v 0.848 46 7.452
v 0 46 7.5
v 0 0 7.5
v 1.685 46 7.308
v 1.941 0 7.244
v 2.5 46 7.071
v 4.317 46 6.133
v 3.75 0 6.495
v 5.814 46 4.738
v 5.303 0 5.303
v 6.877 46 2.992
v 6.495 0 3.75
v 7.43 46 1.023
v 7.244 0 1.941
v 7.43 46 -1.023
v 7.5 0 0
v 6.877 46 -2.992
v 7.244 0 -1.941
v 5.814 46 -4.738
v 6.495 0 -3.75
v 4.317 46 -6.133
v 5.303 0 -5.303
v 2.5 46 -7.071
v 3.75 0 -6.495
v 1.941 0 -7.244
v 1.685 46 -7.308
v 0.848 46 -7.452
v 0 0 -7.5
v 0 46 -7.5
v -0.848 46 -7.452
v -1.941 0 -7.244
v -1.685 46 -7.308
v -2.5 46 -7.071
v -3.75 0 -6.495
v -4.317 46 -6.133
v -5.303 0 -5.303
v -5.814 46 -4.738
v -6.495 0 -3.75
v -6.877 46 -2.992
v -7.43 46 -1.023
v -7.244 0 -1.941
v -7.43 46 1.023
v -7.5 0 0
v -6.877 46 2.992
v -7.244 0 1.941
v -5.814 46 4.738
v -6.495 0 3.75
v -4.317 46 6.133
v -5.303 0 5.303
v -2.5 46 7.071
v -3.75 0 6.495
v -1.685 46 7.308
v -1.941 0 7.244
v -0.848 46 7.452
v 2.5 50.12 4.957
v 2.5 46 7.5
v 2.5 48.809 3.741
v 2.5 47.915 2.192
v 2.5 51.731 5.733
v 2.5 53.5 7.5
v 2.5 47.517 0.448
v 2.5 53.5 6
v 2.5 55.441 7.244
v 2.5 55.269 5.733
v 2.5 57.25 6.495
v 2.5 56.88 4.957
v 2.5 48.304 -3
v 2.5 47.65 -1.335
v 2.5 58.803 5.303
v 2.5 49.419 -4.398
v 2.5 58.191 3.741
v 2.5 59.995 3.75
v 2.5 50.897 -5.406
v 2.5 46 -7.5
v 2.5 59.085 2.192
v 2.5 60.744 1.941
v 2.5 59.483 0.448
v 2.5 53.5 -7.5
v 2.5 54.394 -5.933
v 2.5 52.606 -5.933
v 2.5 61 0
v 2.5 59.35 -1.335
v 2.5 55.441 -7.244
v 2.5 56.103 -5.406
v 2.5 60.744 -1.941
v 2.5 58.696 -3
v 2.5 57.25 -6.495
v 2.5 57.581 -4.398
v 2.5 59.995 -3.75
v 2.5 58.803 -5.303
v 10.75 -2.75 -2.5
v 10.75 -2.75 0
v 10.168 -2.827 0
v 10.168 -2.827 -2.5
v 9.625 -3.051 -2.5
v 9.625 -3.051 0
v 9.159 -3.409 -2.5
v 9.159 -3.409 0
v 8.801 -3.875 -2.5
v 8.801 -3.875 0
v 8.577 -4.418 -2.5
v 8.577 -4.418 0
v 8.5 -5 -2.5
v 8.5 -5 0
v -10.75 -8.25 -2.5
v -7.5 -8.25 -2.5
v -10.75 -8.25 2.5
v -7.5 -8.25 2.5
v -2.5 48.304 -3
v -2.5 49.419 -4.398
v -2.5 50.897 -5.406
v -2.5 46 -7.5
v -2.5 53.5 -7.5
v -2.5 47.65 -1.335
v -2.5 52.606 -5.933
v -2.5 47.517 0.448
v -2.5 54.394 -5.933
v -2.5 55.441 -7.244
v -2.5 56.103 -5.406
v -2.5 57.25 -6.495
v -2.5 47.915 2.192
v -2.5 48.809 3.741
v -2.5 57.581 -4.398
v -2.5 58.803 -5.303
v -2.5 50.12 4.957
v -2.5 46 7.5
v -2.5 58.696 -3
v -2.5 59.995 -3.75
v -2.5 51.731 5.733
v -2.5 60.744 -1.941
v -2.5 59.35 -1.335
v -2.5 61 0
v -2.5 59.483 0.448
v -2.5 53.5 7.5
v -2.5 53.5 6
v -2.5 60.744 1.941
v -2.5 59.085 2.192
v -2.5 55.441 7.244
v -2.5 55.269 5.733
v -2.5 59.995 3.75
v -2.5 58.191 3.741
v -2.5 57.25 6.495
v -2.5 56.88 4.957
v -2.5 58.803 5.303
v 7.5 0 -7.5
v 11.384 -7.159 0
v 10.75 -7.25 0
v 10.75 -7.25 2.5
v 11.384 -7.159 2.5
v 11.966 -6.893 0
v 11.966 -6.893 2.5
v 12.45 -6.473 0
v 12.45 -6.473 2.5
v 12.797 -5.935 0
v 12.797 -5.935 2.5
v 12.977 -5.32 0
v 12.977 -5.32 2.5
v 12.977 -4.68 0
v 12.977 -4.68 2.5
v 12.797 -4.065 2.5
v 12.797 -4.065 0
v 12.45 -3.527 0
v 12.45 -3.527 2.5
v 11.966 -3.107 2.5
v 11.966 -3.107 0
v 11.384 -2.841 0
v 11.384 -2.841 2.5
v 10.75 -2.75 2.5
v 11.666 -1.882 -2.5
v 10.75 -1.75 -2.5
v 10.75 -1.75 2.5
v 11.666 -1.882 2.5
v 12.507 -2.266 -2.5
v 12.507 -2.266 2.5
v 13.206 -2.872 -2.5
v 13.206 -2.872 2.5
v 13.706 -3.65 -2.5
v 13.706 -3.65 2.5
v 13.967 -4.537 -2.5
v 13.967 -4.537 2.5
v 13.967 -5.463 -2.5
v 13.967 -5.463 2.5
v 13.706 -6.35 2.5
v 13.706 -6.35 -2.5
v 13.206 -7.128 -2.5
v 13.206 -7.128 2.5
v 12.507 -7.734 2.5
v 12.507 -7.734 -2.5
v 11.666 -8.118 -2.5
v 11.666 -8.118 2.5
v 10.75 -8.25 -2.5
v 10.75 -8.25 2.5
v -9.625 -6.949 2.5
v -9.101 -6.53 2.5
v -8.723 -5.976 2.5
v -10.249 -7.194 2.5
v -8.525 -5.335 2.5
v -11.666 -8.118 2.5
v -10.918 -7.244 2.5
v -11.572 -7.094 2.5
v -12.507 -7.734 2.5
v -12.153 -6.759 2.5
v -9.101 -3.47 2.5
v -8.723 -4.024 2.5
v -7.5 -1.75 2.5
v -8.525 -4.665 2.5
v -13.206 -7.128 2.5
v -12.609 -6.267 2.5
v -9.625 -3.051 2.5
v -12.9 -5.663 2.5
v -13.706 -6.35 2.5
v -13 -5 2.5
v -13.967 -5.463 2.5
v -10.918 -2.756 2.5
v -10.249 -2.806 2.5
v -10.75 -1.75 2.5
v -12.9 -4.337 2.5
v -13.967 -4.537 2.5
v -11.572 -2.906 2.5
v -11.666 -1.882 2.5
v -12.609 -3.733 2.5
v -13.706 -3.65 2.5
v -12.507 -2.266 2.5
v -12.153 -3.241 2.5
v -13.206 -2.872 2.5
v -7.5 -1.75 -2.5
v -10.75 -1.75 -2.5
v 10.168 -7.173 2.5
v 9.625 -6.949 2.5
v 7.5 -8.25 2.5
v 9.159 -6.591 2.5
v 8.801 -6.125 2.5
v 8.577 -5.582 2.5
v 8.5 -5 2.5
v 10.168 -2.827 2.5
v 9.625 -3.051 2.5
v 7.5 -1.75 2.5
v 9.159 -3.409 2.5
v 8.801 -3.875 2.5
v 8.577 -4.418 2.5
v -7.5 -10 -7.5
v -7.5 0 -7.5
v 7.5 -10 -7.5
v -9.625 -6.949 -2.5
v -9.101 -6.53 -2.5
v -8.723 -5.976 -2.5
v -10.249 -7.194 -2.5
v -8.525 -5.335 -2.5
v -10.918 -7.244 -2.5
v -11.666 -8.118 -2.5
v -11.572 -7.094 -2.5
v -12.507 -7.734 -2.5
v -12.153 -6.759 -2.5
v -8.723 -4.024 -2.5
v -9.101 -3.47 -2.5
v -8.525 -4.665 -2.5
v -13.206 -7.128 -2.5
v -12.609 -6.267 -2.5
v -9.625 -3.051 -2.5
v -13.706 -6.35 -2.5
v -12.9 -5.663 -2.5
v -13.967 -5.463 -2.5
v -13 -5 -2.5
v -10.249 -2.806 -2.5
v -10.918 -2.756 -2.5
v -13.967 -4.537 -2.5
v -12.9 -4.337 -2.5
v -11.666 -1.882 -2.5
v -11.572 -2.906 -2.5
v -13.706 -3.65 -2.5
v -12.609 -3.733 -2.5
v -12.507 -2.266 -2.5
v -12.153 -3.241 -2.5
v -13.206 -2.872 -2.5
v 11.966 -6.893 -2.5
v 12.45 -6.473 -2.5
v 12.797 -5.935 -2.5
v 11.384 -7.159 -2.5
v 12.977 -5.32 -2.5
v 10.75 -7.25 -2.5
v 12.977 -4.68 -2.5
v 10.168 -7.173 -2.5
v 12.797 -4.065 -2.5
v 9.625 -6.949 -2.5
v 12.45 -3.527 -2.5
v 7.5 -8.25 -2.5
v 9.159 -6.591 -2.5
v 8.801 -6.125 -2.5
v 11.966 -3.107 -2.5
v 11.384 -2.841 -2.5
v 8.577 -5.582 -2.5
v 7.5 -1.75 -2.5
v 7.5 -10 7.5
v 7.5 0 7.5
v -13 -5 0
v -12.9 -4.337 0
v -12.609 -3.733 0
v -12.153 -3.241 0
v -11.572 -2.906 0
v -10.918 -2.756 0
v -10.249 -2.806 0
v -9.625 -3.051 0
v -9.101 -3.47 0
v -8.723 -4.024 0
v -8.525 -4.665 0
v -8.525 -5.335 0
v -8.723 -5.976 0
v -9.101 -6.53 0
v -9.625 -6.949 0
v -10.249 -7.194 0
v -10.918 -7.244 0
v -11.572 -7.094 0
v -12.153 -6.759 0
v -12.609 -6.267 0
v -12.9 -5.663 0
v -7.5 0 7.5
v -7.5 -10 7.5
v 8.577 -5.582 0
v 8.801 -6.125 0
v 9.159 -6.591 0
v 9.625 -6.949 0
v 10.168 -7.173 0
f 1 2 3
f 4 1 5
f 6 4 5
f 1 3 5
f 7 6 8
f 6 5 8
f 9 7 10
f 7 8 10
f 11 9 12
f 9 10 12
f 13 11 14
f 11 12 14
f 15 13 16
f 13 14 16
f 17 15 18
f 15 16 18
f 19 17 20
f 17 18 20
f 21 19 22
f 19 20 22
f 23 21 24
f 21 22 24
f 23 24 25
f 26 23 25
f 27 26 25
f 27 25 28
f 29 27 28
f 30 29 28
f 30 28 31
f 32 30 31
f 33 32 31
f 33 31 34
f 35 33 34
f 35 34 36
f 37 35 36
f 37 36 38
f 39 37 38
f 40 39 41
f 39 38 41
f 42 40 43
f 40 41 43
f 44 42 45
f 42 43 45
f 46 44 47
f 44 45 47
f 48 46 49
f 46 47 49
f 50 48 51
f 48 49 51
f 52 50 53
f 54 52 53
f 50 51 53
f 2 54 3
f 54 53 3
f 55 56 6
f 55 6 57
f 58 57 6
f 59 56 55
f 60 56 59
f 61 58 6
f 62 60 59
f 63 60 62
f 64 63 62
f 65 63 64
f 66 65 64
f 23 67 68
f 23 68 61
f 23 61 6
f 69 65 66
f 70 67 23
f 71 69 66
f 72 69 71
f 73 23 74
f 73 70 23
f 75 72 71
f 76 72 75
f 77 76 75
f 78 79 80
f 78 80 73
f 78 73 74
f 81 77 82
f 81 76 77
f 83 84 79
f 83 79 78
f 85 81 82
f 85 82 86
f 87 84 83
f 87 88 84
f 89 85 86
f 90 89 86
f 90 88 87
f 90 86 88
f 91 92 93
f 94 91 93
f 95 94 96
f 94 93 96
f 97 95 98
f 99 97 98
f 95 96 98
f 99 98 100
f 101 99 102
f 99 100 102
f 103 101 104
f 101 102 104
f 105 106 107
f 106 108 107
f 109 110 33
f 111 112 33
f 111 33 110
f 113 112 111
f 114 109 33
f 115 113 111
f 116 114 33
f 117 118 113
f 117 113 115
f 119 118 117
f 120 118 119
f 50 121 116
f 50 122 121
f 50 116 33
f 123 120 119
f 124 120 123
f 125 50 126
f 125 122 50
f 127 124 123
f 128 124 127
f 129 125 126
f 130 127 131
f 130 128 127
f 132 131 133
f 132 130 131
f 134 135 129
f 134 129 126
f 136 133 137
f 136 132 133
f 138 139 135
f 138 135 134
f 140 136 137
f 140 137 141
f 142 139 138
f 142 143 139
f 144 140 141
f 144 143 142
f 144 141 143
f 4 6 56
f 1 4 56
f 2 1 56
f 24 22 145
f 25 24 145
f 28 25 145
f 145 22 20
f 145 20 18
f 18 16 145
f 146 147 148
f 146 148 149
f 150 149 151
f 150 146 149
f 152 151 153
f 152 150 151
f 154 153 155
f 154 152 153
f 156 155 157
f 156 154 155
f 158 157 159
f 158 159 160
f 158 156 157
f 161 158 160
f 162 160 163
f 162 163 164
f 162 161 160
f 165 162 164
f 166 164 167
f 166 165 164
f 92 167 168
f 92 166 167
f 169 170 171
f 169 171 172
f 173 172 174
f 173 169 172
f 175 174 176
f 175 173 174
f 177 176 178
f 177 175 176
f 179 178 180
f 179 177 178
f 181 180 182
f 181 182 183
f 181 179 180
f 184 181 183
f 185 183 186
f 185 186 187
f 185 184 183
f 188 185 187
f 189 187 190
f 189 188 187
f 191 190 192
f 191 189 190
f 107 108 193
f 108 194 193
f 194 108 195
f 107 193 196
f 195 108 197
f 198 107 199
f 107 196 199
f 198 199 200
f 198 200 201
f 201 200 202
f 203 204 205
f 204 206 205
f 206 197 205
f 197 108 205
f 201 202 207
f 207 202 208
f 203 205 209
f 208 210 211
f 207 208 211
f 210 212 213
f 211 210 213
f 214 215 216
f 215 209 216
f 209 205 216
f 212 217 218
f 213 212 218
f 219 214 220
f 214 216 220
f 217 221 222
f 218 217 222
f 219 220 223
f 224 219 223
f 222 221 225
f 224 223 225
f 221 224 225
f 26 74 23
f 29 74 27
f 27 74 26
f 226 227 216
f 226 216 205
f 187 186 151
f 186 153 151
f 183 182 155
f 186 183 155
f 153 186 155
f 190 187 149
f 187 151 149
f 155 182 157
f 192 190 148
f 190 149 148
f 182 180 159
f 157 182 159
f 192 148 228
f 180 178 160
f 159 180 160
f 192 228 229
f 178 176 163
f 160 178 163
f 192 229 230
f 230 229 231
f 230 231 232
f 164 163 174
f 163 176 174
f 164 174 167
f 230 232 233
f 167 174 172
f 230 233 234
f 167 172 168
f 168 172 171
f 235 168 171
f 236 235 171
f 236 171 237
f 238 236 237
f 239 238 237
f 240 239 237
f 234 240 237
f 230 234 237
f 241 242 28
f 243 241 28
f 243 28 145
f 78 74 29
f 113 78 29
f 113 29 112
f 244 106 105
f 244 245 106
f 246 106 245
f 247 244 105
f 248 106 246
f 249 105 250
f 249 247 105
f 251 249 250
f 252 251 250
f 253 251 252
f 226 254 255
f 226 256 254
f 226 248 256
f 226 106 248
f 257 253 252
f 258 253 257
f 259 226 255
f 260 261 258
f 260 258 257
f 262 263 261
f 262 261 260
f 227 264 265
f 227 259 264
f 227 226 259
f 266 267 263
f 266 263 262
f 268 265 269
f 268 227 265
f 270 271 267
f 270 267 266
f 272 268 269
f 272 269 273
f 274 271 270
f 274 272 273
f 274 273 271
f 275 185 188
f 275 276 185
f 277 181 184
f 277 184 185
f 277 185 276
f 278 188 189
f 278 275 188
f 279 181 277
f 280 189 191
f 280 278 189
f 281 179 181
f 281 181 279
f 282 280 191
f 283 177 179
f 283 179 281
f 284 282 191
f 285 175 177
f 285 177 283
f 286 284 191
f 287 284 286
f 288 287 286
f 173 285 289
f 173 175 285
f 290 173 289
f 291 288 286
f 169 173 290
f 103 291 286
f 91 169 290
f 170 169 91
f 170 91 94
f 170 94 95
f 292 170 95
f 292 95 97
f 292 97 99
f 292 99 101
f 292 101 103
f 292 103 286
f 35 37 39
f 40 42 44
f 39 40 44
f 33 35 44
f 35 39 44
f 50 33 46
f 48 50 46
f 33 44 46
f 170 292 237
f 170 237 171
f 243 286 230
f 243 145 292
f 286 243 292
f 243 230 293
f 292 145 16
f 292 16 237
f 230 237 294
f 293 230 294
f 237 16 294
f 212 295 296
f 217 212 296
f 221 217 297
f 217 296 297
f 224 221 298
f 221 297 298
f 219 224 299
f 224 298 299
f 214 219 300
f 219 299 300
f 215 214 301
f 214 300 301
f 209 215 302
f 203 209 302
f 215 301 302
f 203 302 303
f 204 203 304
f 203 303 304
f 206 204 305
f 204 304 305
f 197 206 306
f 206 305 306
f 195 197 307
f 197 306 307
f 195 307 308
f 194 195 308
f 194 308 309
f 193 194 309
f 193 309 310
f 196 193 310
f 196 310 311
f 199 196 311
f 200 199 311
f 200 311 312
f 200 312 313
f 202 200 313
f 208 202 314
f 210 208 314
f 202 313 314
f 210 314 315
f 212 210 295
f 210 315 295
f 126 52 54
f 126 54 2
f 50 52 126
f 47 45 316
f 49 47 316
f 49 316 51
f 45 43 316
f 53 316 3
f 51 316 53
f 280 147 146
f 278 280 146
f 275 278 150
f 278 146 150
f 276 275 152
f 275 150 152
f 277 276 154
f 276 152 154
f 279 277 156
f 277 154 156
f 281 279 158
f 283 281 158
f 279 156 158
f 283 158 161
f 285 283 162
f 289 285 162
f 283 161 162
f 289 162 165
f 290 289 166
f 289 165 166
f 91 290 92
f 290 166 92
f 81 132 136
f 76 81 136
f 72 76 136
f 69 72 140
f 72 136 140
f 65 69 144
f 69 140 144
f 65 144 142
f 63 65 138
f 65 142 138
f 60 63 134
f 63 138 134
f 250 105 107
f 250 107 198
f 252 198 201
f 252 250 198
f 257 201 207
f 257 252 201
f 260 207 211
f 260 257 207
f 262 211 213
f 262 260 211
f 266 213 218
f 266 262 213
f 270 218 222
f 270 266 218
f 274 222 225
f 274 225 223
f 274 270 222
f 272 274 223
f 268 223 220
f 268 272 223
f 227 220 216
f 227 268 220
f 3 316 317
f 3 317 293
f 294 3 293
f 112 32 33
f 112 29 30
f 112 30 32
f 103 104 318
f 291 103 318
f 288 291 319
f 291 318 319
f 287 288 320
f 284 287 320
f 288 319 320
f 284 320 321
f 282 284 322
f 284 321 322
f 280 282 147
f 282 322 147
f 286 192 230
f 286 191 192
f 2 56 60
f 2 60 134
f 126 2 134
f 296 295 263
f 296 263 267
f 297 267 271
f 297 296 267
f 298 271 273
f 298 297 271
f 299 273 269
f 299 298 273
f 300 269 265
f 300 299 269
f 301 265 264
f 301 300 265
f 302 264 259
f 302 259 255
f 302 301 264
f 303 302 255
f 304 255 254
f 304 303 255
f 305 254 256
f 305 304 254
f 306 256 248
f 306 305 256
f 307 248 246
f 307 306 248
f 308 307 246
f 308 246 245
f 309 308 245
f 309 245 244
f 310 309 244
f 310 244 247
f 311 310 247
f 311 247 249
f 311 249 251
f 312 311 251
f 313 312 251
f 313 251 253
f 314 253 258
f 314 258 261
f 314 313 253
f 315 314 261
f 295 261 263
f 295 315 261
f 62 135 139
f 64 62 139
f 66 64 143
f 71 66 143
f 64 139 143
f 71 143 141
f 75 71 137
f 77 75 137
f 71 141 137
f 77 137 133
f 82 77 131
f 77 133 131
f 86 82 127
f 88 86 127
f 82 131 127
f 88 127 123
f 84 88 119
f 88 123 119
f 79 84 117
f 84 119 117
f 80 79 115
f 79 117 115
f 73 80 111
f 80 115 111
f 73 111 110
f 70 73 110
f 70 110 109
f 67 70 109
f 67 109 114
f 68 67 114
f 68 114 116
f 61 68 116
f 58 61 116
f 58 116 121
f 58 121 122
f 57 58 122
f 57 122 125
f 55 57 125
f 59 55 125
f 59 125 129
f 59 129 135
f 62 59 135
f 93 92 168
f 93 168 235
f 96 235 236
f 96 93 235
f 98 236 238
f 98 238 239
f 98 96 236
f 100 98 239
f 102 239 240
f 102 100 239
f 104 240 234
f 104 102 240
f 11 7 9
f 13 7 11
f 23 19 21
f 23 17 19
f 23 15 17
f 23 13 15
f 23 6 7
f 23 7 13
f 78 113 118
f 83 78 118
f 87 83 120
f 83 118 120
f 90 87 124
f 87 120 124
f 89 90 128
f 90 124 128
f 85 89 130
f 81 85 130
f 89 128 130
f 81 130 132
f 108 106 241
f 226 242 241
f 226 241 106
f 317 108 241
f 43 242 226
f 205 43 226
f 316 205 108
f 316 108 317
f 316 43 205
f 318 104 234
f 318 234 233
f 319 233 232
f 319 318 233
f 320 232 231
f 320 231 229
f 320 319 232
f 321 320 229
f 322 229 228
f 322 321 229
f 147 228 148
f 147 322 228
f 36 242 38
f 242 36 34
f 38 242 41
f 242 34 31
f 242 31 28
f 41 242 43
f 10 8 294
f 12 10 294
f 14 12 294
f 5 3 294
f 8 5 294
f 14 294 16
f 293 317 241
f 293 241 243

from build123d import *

# Parameters (mm, degrees)
SKETCH1_R           = 7.5
BOSS_EXTRUDE1_DEPTH = 46
SKETCH2_W           = 15
SKETCH2_H           = 15
BOSS_EXTRUDE2_DEPTH = 10
BOSS_EXTRUDE3_DEPTH = 15
CUT_EXTRUDE4_DEPTH  = 64.263338514
SKETCH6_R           = 6
CUT_EXTRUDE5_DEPTH  = 64.263338514
SKETCH7_R           = 6
CUT_EXTRUDE6_DEPTH  = 5
CUT_EXTRUDE7_START  = -5
CUT_EXTRUDE7_DEPTH  = 5
SKETCH11_R          = 3.25
SKETCH11_R_2        = 2.25
BOSS_EXTRUDE4_DEPTH = 2.5
BOSS_EXTRUDE5_DEPTH = 2.5


with BuildPart() as part:
    # Sketch1 → Boss-Extrude1 (new body)
    with BuildSketch(Plane(origin=(0, 0, 0), x_dir=(1, 0, 0), z_dir=(0, 1, 0))):
        with Locations(Location((0, 0, 0), (0, 0, 270))):
            Circle(SKETCH1_R)
    extrude(amount=BOSS_EXTRUDE1_DEPTH)

    # Sketch2 → Boss-Extrude2 (add)
    with BuildSketch(Plane.XZ):
        Rectangle(SKETCH2_W, SKETCH2_H)
    extrude(amount=BOSS_EXTRUDE2_DEPTH)

    # Sketch4 → Boss-Extrude3 (add)
    with BuildSketch(Plane(origin=(0, 46, 0), x_dir=(1, 0, 0), z_dir=(0, 1, 0))):
        Polygon((0, 7.5), (7.5, 7.5), (7.5, -7.5), (-7.5, -7.5), (-7.5, 7.5), align=None)
    extrude(amount=BOSS_EXTRUDE3_DEPTH)

    # Sketch5 → Cut-Extrude4 (cut, through all)
    with BuildSketch(Plane.ZY.offset(7.5)):
        with BuildLine():
            ThreePointArc((-7.5, 53.5), (-5.303300859, 58.803300859), (0, 61))
            Line((0, 61), (-7.5, 61))
            Line((-7.5, 61), (-7.5, 53.5))
        make_face()
        with BuildLine():
            Line((7.5, 61), (0, 61))
            ThreePointArc((0, 61), (5.303300859, 58.803300859), (7.5, 53.5))
            Line((7.5, 53.5), (7.5, 61))
        make_face()
    extrude(amount=-CUT_EXTRUDE4_DEPTH, mode=Mode.SUBTRACT)

    # Sketch6 → Cut-Extrude5 (cut, through all)
    with BuildSketch(Plane.ZY.offset(7.5)):
        with Locations((0, 53.5)):
            Circle(SKETCH6_R)
    extrude(amount=-CUT_EXTRUDE5_DEPTH, mode=Mode.SUBTRACT)

    # Sketch7 → Cut-Extrude6 (cut)
    # profile 1 of 4: a face of its own
    with BuildSketch(Plane.ZY.offset(7.5)):
        with BuildLine():
            ThreePointArc((0, 46), (-5.303300859, 48.196699141), (-7.5, 53.5))
            Line((-7.5, 53.5), (-7.5, 46))
            Line((-7.5, 46), (0, 46))
        make_face()
    # profile 2 of 4: a face of its own
    with BuildSketch(Plane.ZY.offset(7.5)):
        with BuildLine():
            Line((7.5, 46), (7.5, 53.5))
            ThreePointArc((7.5, 53.5), (5.303300859, 48.196699141), (0, 46))
            Line((0, 46), (7.5, 46))
        make_face()
    # profile 3 of 4: a face of its own
    with BuildSketch(Plane.ZY.offset(7.5)):
        with BuildLine():
            ThreePointArc((7.5, 53.5), (0, 61), (-7.5, 53.5))
            ThreePointArc((-7.5, 53.5), (-5.303300859, 48.196699141), (0, 46))
            ThreePointArc((0, 46), (5.303300859, 48.196699141), (7.5, 53.5))
        make_face()
        with Locations((0, 53.5)):
            Circle(SKETCH7_R, mode=Mode.SUBTRACT)
    # profile 4 of 4: a face of its own
    with BuildSketch(Plane.ZY.offset(7.5)):
        with Locations((0, 53.5)):
            Circle(SKETCH7_R)
    extrude(amount=-CUT_EXTRUDE6_DEPTH, mode=Mode.SUBTRACT)

    # Sketch10 → Cut-Extrude7 (cut)
    with BuildSketch(Plane(origin=(7.5, 0, 0), x_dir=(0, 0, -1), z_dir=(1, 0, 0)).offset(CUT_EXTRUDE7_START)):
        with BuildLine():
            Line((7.5, 53.5), (6, 53.5))
            ThreePointArc((6, 53.5), (0, 47.5), (-6, 53.5))
            Line((-6, 53.5), (-7.5, 53.5))
            Line((-7.5, 53.5), (-7.5, 46))
            Line((-7.5, 46), (0, 46))
            Line((0, 46), (7.5, 46))
            Line((7.5, 46), (7.5, 53.5))
        make_face()
        with BuildLine():
            ThreePointArc((-6, 53.5), (0, 59.5), (6, 53.5))
            Line((6, 53.5), (7.5, 53.5))
            ThreePointArc((7.5, 53.5), (0, 61), (-7.5, 53.5))
            Line((-7.5, 53.5), (-6, 53.5))
        make_face()
    extrude(amount=CUT_EXTRUDE7_DEPTH, mode=Mode.SUBTRACT)

    # Sketch11 → Boss-Extrude4 (add, symmetric)
    # profile 1 of 3: a face of its own
    with BuildSketch(Plane(origin=(0, 0, 0), x_dir=(-1, 0, 0), z_dir=(0, 0, -1))):
        with BuildLine():
            Line((7.5, -1.75), (7.5, -5))
            ThreePointArc((7.5, -5), (8.451902961, -2.701902961), (10.75, -1.75))
            Line((10.75, -1.75), (7.5, -1.75))
        make_face()
    # profile 2 of 3: a face of its own
    with BuildSketch(Plane(origin=(0, 0, 0), x_dir=(-1, 0, 0), z_dir=(0, 0, -1))):
        with BuildLine():
            Line((7.5, -5), (7.5, -8.25))
            Line((7.5, -8.25), (10.75, -8.25))
            ThreePointArc((10.75, -8.25), (8.451902961, -7.298097039), (7.5, -5))
        make_face()
    # profile 3 of 3: a face of its own
    with BuildSketch(Plane(origin=(0, 0, 0), x_dir=(-1, 0, 0), z_dir=(0, 0, -1))):
        with Locations((10.75, -5)):
            Circle(SKETCH11_R)
        with Locations((10.75, -5)):
            Circle(SKETCH11_R_2, mode=Mode.SUBTRACT)
    extrude(amount=BOSS_EXTRUDE4_DEPTH, both=True)

    # Sketch12 → Boss-Extrude5 (add, symmetric)
    with BuildSketch(Plane(origin=(0, 0, 0), x_dir=(-1, 0, 0), z_dir=(0, 0, -1))):
        with BuildLine():
            Line((-7.5, -8.25), (-7.5, -5))
            ThreePointArc((-7.5, -5), (-8.451902961, -7.298097039), (-10.75, -8.25))
            Line((-10.75, -8.25), (-7.5, -8.25))
        make_face()
        with BuildLine():
            Line((-7.5, -5), (-7.5, -1.75))
            Line((-7.5, -1.75), (-10.75, -1.75))
            ThreePointArc((-10.75, -1.75), (-8.451902961, -2.701902961), (-7.5, -5))
        make_face()
        with BuildLine():
            ThreePointArc((-7.5, -5), (-8.451902961, -2.701902961), (-10.75, -1.75))
            Line((-10.75, -1.75), (-10.75, -2.75))
            ThreePointArc((-10.75, -2.75), (-9.159009742, -3.409009742), (-8.5, -5))
            Line((-8.5, -5), (-7.5, -5))
        make_face()
        with BuildLine():
            ThreePointArc((-10.75, -8.25), (-8.451902961, -7.298097039), (-7.5, -5))
            Line((-7.5, -5), (-8.5, -5))
            ThreePointArc((-8.5, -5), (-9.159009742, -6.590990258), (-10.75, -7.25))
            Line((-10.75, -7.25), (-10.75, -8.25))
        make_face()
        with BuildLine():
            Line((-10.75, -2.75), (-10.75, -1.75))
            ThreePointArc((-10.75, -1.75), (-14, -5), (-10.75, -8.25))
            Line((-10.75, -8.25), (-10.75, -7.25))
            ThreePointArc((-10.75, -7.25), (-13, -5), (-10.75, -2.75))
        make_face()
    extrude(amount=BOSS_EXTRUDE5_DEPTH, both=True)


solid = part.part
